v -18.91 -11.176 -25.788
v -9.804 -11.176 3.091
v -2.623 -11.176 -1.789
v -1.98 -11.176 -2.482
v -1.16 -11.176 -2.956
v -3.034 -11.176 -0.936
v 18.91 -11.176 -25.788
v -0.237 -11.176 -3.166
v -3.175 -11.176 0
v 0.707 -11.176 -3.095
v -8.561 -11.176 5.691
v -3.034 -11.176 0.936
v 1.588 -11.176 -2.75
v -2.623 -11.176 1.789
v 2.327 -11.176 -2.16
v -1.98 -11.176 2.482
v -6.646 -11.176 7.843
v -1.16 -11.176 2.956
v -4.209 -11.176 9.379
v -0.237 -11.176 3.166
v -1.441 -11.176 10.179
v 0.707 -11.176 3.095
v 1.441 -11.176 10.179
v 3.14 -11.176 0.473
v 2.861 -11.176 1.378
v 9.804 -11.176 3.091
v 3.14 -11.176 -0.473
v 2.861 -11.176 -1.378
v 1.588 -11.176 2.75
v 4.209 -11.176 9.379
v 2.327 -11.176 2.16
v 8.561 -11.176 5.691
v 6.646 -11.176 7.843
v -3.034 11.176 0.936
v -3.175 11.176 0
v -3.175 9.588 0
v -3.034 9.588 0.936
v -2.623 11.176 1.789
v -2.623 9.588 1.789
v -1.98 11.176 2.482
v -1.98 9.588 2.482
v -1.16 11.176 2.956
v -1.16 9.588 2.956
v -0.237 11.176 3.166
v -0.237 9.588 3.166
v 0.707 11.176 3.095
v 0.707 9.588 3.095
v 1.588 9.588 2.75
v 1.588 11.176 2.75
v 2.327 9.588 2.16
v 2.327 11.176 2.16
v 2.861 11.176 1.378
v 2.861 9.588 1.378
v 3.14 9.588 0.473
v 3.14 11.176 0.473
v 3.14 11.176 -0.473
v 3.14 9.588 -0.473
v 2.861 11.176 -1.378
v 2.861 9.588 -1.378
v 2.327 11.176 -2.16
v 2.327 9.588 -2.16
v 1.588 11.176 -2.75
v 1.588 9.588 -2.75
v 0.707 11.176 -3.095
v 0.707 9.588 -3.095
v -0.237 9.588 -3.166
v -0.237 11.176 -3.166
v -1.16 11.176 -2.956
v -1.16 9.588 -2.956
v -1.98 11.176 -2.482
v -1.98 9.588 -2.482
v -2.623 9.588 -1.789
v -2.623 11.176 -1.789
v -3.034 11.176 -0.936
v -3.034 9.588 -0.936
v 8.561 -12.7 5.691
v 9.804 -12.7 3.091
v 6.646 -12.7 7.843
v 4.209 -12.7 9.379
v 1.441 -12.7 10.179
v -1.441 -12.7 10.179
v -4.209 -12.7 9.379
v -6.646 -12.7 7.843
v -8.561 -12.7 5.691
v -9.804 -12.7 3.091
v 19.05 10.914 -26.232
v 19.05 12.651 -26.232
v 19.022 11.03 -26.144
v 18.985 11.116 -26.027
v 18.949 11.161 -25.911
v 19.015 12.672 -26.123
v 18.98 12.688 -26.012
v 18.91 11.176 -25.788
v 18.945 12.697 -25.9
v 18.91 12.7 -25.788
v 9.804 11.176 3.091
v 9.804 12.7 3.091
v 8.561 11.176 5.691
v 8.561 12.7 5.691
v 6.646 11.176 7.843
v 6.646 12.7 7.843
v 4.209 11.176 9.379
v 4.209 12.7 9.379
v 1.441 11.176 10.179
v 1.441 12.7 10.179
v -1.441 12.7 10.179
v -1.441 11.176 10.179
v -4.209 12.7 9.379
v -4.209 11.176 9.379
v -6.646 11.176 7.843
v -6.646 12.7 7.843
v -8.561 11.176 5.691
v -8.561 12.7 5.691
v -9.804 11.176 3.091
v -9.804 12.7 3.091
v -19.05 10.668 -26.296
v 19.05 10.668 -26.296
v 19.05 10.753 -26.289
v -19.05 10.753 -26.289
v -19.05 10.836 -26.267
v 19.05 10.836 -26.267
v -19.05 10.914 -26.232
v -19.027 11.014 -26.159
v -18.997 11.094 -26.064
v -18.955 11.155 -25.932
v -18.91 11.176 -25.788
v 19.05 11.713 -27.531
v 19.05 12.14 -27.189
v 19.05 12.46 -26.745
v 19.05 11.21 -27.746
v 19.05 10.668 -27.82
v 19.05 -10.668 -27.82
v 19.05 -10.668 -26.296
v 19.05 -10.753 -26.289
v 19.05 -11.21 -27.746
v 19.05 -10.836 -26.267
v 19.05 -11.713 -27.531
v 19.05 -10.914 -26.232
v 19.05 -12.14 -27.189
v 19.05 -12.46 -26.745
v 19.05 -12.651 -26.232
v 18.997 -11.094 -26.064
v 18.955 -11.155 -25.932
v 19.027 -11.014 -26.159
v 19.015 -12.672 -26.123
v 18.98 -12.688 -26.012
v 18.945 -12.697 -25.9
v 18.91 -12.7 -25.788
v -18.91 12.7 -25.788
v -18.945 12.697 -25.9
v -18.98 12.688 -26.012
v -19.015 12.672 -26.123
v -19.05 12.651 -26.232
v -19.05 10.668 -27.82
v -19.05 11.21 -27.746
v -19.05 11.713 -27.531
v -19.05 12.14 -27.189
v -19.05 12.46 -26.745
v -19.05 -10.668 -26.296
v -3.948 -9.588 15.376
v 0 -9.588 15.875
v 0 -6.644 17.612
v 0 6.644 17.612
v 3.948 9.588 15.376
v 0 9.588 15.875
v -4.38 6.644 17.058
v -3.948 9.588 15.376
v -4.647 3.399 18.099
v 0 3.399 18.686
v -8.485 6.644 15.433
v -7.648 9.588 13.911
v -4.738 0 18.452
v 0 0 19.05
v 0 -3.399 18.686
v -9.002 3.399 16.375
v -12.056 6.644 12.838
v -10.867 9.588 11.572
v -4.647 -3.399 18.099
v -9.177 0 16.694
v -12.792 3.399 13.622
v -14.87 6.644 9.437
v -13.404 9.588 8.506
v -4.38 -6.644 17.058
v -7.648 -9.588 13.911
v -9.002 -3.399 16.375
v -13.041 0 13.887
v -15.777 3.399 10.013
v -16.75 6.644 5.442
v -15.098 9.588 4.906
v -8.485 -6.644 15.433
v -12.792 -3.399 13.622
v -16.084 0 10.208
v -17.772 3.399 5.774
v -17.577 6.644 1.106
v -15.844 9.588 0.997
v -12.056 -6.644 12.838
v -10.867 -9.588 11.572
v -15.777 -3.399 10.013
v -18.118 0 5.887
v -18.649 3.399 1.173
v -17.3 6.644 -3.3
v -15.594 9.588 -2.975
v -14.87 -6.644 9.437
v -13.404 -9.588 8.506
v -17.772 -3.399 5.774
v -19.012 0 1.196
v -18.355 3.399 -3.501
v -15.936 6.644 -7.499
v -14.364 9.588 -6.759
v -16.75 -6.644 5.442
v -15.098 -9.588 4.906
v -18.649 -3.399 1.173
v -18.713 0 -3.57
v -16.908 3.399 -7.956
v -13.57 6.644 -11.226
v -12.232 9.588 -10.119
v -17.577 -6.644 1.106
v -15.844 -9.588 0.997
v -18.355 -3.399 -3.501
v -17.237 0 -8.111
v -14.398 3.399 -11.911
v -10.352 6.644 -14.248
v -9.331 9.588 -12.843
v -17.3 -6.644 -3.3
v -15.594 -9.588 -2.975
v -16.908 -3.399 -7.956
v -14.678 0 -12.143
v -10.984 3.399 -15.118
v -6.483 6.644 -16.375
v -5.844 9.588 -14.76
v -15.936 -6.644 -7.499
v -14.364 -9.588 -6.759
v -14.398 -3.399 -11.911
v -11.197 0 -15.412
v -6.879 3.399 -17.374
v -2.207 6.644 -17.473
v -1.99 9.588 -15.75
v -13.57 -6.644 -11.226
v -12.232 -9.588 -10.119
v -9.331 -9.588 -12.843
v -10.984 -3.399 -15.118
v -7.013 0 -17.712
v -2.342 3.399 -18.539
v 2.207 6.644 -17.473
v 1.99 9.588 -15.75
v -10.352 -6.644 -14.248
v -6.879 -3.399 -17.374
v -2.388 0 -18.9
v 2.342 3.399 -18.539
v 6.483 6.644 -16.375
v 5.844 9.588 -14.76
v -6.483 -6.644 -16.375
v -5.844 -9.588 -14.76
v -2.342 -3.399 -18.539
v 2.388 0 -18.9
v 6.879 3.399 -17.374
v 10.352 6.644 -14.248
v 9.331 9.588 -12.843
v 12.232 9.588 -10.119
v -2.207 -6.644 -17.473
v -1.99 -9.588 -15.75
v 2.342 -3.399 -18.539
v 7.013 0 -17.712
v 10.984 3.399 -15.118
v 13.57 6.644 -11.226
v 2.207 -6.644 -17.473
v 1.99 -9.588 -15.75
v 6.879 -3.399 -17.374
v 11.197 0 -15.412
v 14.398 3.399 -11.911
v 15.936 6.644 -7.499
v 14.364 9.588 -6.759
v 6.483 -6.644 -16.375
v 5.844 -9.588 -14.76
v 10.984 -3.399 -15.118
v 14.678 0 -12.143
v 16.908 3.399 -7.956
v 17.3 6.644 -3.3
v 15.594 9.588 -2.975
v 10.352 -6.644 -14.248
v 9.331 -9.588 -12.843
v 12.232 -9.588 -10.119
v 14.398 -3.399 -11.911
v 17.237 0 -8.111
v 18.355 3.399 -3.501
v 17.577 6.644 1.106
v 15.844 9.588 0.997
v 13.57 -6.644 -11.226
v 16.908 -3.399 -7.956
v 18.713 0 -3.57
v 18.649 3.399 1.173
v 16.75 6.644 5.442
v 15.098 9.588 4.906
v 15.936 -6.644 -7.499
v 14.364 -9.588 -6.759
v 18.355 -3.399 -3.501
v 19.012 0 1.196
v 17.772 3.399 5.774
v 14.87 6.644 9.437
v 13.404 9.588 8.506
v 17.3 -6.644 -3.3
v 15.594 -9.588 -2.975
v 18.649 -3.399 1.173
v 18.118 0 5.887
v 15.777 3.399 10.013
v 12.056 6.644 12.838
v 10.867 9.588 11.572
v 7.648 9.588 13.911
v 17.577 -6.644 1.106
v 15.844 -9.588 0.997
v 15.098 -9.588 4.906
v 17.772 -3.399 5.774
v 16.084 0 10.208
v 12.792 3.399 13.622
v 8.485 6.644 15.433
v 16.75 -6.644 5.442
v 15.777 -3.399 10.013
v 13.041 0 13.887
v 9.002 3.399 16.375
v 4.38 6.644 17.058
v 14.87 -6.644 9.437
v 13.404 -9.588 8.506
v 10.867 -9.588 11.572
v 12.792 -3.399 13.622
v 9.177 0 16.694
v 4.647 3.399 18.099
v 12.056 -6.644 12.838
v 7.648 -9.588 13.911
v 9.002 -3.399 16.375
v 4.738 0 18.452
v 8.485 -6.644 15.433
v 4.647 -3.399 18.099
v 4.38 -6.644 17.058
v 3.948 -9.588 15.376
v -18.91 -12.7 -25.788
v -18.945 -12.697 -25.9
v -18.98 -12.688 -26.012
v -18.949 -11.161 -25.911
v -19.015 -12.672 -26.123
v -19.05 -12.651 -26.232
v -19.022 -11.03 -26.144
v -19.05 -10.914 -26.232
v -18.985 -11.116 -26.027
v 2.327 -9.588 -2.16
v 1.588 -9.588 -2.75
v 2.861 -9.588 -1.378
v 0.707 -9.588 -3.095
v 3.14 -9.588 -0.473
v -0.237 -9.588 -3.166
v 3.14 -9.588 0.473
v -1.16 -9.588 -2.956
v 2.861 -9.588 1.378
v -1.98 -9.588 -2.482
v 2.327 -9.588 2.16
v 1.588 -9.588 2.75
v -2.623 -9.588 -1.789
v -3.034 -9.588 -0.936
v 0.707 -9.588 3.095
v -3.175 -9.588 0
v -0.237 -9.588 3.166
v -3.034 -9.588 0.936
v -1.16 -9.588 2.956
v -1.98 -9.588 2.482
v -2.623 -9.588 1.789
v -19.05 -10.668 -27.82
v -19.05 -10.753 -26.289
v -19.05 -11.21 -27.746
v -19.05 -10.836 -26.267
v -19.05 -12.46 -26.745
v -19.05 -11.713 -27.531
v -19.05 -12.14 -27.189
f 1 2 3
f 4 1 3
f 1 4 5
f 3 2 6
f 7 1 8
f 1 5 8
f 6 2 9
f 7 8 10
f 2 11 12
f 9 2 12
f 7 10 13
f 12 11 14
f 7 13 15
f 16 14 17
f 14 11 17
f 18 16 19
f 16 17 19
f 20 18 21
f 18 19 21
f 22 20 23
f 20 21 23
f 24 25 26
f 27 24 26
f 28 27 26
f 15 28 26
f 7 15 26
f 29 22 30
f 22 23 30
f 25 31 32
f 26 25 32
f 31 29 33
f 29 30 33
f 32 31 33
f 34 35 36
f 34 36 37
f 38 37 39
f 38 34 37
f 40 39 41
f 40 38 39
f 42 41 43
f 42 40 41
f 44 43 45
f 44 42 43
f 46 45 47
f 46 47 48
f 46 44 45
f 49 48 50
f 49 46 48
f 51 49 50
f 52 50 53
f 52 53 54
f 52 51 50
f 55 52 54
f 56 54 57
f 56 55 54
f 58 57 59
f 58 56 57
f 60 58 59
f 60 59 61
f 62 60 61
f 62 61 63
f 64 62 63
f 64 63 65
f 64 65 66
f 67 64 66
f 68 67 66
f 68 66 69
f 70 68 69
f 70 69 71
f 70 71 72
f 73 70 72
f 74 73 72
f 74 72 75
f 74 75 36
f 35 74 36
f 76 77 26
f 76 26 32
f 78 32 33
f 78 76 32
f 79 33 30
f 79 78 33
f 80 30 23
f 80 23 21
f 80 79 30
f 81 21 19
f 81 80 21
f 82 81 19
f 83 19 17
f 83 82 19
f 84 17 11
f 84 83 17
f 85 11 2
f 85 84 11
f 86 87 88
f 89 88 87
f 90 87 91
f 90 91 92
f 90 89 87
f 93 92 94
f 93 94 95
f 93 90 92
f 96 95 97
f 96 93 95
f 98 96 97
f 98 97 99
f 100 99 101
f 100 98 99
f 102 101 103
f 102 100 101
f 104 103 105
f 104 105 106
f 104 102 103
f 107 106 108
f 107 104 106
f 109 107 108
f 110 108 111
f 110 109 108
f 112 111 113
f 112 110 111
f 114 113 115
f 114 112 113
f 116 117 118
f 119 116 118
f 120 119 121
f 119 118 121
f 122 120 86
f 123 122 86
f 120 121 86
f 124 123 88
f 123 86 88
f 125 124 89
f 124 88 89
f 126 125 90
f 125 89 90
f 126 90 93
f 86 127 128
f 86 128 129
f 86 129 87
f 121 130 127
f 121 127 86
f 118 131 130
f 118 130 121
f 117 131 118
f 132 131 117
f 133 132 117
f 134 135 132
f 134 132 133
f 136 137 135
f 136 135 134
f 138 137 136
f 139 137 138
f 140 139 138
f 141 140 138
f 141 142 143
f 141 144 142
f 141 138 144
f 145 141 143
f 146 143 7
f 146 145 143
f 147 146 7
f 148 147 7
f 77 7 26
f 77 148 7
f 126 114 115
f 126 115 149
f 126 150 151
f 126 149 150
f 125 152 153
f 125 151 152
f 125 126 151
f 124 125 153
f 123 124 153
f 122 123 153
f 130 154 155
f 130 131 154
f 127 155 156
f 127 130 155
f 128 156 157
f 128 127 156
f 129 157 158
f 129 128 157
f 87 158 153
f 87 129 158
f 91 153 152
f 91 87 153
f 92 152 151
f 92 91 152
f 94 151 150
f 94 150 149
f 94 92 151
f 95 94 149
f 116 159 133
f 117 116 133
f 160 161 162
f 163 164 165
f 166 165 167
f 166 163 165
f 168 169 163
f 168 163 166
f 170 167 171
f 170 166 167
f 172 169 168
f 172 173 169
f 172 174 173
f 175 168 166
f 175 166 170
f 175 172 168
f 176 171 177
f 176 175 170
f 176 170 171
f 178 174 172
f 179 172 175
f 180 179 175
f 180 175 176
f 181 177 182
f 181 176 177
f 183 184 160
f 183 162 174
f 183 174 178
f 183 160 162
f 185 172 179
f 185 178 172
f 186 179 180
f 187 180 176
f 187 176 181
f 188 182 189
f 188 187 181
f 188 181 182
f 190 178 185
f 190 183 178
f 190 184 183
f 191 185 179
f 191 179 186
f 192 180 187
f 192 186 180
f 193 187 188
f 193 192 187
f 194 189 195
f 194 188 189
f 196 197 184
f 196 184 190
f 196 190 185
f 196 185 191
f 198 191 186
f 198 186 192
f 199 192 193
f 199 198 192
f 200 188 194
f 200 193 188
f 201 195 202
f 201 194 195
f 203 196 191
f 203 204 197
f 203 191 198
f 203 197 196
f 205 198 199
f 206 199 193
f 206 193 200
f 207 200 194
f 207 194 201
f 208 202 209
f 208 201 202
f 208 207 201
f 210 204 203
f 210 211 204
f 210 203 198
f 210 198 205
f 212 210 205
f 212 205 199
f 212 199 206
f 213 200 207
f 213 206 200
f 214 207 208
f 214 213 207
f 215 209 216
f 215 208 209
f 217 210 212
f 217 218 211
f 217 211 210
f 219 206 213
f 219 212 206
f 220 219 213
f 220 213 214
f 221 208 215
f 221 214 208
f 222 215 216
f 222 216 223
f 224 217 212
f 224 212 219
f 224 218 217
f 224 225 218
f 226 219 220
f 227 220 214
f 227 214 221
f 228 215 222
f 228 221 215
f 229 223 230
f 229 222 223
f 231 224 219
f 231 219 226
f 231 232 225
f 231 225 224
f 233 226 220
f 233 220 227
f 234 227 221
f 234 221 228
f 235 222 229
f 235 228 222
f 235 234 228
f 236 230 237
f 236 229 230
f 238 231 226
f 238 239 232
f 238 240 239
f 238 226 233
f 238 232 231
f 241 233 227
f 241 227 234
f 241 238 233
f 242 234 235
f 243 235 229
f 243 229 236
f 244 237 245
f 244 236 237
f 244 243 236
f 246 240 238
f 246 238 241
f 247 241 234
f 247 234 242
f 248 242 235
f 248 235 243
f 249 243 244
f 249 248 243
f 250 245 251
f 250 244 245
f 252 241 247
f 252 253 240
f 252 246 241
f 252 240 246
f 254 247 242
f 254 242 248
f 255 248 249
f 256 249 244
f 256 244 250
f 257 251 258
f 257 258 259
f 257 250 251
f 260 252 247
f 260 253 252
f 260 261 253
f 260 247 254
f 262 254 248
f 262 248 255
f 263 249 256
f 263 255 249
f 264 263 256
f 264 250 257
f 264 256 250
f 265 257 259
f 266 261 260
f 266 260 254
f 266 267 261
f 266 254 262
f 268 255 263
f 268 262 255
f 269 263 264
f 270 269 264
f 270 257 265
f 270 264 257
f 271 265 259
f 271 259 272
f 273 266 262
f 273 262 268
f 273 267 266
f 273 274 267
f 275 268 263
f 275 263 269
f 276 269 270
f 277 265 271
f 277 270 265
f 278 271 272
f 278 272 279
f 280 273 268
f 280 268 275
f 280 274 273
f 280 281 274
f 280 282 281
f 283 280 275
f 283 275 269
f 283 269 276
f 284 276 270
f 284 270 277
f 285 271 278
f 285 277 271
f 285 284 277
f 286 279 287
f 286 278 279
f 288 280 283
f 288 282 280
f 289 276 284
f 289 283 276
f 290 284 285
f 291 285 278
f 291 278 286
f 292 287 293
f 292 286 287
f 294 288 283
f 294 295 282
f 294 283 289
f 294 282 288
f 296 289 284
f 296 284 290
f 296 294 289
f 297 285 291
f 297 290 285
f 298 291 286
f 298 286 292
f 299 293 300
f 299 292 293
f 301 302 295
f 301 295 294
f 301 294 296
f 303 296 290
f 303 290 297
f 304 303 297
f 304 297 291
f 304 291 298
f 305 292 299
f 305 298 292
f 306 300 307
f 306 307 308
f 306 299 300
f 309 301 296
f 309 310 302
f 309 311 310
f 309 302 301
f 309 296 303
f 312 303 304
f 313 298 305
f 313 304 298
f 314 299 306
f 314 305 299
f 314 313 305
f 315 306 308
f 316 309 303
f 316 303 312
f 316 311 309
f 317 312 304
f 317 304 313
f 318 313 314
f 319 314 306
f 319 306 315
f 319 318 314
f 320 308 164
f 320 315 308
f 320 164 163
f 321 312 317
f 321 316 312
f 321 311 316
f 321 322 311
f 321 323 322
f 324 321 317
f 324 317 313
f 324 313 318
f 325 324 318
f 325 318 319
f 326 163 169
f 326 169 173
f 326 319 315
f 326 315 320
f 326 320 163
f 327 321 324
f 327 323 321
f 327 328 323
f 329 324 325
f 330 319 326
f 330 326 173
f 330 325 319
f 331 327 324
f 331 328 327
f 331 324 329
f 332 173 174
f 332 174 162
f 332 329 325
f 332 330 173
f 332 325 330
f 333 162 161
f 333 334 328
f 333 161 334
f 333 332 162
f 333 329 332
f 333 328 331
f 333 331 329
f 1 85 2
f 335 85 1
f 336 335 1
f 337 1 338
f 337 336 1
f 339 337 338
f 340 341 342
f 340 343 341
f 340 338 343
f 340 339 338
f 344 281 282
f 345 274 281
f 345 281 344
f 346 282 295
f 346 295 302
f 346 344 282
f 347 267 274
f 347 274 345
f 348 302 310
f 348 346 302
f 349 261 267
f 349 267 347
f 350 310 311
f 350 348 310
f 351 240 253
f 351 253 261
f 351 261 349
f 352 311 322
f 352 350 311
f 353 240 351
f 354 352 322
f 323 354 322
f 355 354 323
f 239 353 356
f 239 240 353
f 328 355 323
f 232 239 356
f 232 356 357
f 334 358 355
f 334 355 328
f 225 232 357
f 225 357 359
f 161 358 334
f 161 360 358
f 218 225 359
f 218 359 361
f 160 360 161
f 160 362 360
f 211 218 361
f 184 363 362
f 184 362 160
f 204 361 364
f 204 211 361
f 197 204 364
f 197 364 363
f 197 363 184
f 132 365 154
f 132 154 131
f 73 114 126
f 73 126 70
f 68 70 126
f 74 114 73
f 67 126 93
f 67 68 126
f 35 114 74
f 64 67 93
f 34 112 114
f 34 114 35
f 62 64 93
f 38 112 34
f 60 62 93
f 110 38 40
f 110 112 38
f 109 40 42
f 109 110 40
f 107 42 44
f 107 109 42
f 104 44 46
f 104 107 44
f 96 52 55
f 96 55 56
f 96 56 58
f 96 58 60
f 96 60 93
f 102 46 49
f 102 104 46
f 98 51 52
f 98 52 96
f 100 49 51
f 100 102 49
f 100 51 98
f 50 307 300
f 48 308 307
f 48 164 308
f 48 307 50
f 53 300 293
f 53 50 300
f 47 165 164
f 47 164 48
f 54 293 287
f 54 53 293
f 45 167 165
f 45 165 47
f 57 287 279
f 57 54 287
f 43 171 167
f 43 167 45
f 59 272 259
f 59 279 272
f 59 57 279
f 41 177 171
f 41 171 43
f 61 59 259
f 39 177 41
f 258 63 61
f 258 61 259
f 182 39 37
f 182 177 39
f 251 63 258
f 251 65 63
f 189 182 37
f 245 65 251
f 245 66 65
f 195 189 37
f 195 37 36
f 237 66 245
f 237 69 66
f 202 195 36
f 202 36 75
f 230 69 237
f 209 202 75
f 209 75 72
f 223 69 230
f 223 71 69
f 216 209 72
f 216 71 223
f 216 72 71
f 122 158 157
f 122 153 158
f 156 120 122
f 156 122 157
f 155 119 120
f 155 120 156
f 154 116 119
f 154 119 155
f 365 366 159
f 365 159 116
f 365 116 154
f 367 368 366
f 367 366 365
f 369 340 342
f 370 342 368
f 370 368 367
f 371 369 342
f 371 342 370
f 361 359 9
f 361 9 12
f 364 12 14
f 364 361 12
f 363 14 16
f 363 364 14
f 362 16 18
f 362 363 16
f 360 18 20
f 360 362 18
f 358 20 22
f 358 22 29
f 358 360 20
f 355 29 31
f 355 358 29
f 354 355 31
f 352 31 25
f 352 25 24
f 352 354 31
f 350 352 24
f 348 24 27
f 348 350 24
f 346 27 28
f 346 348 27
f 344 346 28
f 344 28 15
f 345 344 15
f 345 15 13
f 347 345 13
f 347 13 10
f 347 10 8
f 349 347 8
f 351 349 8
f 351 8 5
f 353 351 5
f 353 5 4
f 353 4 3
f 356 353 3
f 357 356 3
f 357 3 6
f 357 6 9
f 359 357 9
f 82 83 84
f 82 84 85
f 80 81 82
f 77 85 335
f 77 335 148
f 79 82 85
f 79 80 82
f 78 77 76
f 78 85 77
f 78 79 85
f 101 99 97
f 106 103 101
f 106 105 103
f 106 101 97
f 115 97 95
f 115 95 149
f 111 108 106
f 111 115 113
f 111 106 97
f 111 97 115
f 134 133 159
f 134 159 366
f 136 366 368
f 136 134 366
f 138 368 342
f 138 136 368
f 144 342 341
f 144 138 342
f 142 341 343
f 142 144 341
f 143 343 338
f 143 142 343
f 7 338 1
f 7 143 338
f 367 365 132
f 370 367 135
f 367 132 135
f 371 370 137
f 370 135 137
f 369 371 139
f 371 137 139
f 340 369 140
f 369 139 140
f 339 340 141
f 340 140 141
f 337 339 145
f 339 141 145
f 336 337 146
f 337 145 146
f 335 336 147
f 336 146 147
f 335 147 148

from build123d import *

# Parameters (mm, degrees)
F1_DEPTH = 12.7
F2_R     = 2.032
F3_T     = -1.524
F4_R     = 3.175
F5_DEPTH = 25.4


with BuildPart() as f1:
    # F0 (on Front) → F1 (new body, symmetric)
    with BuildSketch(Plane.XZ):
        with BuildLine():
            Line((19.05, -26.232438), (9.804269, 3.091274))
            ThreePointArc((9.804269, 3.091274), (0, 10.280062), (-9.804269, 3.091274))
            Line((-9.804269, 3.091274), (-19.05, -26.232438))
            Line((-19.05, -26.232438), (-19.05, -27.819938))
            Line((-19.05, -27.819938), (19.05, -27.819938))
            Line((19.05, -27.819938), (19.05, -26.232438))
        make_face()
    extrude(amount=F1_DEPTH, both=True)

    # F2
    f2_edges = [f1.edges().sort_by_distance(p)[0] for p in [
        (0, -12.7, -27.819938),
        (0, 12.7, -27.819938),
    ]]
    fillet(f2_edges, radius=F2_R)

    # F3
    f3_openings = [f1.faces().sort_by_distance(p)[0] for p in [
        (19.05, 0, -27.01023),
        (14.427045, 0, -11.570299),
        (0, 0, 10.280062),
        (-14.427045, 0, -11.570299),
        (-19.05, 0, -27.01023),
    ]]
    offset(amount=F3_T, openings=f3_openings)

    # F4 (on face) → F5 (join, through all)
    with BuildSketch(Plane(origin=(0, 12.7, 0), x_dir=(-1, 0, 0), z_dir=(0, 1, 0))):
        Circle(F4_R)
    extrude(amount=-F5_DEPTH)

    # F6 (on Right) → F7 (revolve)
    with BuildSketch(Plane.YZ):
        with BuildLine():
            Line((-9.5885, 15.875), (-9.5885, 0))
            Line((-9.5885, 0), (9.5885, 0))
            Line((9.5885, 0), (9.5885, 15.875))
            ThreePointArc((9.5885, 15.875), (0, 19.05), (-9.5885, 15.875))
        make_face()
    revolve(axis=Axis((0, -21.11639, 0), (0, -1, 0)))


solid = f1.part
